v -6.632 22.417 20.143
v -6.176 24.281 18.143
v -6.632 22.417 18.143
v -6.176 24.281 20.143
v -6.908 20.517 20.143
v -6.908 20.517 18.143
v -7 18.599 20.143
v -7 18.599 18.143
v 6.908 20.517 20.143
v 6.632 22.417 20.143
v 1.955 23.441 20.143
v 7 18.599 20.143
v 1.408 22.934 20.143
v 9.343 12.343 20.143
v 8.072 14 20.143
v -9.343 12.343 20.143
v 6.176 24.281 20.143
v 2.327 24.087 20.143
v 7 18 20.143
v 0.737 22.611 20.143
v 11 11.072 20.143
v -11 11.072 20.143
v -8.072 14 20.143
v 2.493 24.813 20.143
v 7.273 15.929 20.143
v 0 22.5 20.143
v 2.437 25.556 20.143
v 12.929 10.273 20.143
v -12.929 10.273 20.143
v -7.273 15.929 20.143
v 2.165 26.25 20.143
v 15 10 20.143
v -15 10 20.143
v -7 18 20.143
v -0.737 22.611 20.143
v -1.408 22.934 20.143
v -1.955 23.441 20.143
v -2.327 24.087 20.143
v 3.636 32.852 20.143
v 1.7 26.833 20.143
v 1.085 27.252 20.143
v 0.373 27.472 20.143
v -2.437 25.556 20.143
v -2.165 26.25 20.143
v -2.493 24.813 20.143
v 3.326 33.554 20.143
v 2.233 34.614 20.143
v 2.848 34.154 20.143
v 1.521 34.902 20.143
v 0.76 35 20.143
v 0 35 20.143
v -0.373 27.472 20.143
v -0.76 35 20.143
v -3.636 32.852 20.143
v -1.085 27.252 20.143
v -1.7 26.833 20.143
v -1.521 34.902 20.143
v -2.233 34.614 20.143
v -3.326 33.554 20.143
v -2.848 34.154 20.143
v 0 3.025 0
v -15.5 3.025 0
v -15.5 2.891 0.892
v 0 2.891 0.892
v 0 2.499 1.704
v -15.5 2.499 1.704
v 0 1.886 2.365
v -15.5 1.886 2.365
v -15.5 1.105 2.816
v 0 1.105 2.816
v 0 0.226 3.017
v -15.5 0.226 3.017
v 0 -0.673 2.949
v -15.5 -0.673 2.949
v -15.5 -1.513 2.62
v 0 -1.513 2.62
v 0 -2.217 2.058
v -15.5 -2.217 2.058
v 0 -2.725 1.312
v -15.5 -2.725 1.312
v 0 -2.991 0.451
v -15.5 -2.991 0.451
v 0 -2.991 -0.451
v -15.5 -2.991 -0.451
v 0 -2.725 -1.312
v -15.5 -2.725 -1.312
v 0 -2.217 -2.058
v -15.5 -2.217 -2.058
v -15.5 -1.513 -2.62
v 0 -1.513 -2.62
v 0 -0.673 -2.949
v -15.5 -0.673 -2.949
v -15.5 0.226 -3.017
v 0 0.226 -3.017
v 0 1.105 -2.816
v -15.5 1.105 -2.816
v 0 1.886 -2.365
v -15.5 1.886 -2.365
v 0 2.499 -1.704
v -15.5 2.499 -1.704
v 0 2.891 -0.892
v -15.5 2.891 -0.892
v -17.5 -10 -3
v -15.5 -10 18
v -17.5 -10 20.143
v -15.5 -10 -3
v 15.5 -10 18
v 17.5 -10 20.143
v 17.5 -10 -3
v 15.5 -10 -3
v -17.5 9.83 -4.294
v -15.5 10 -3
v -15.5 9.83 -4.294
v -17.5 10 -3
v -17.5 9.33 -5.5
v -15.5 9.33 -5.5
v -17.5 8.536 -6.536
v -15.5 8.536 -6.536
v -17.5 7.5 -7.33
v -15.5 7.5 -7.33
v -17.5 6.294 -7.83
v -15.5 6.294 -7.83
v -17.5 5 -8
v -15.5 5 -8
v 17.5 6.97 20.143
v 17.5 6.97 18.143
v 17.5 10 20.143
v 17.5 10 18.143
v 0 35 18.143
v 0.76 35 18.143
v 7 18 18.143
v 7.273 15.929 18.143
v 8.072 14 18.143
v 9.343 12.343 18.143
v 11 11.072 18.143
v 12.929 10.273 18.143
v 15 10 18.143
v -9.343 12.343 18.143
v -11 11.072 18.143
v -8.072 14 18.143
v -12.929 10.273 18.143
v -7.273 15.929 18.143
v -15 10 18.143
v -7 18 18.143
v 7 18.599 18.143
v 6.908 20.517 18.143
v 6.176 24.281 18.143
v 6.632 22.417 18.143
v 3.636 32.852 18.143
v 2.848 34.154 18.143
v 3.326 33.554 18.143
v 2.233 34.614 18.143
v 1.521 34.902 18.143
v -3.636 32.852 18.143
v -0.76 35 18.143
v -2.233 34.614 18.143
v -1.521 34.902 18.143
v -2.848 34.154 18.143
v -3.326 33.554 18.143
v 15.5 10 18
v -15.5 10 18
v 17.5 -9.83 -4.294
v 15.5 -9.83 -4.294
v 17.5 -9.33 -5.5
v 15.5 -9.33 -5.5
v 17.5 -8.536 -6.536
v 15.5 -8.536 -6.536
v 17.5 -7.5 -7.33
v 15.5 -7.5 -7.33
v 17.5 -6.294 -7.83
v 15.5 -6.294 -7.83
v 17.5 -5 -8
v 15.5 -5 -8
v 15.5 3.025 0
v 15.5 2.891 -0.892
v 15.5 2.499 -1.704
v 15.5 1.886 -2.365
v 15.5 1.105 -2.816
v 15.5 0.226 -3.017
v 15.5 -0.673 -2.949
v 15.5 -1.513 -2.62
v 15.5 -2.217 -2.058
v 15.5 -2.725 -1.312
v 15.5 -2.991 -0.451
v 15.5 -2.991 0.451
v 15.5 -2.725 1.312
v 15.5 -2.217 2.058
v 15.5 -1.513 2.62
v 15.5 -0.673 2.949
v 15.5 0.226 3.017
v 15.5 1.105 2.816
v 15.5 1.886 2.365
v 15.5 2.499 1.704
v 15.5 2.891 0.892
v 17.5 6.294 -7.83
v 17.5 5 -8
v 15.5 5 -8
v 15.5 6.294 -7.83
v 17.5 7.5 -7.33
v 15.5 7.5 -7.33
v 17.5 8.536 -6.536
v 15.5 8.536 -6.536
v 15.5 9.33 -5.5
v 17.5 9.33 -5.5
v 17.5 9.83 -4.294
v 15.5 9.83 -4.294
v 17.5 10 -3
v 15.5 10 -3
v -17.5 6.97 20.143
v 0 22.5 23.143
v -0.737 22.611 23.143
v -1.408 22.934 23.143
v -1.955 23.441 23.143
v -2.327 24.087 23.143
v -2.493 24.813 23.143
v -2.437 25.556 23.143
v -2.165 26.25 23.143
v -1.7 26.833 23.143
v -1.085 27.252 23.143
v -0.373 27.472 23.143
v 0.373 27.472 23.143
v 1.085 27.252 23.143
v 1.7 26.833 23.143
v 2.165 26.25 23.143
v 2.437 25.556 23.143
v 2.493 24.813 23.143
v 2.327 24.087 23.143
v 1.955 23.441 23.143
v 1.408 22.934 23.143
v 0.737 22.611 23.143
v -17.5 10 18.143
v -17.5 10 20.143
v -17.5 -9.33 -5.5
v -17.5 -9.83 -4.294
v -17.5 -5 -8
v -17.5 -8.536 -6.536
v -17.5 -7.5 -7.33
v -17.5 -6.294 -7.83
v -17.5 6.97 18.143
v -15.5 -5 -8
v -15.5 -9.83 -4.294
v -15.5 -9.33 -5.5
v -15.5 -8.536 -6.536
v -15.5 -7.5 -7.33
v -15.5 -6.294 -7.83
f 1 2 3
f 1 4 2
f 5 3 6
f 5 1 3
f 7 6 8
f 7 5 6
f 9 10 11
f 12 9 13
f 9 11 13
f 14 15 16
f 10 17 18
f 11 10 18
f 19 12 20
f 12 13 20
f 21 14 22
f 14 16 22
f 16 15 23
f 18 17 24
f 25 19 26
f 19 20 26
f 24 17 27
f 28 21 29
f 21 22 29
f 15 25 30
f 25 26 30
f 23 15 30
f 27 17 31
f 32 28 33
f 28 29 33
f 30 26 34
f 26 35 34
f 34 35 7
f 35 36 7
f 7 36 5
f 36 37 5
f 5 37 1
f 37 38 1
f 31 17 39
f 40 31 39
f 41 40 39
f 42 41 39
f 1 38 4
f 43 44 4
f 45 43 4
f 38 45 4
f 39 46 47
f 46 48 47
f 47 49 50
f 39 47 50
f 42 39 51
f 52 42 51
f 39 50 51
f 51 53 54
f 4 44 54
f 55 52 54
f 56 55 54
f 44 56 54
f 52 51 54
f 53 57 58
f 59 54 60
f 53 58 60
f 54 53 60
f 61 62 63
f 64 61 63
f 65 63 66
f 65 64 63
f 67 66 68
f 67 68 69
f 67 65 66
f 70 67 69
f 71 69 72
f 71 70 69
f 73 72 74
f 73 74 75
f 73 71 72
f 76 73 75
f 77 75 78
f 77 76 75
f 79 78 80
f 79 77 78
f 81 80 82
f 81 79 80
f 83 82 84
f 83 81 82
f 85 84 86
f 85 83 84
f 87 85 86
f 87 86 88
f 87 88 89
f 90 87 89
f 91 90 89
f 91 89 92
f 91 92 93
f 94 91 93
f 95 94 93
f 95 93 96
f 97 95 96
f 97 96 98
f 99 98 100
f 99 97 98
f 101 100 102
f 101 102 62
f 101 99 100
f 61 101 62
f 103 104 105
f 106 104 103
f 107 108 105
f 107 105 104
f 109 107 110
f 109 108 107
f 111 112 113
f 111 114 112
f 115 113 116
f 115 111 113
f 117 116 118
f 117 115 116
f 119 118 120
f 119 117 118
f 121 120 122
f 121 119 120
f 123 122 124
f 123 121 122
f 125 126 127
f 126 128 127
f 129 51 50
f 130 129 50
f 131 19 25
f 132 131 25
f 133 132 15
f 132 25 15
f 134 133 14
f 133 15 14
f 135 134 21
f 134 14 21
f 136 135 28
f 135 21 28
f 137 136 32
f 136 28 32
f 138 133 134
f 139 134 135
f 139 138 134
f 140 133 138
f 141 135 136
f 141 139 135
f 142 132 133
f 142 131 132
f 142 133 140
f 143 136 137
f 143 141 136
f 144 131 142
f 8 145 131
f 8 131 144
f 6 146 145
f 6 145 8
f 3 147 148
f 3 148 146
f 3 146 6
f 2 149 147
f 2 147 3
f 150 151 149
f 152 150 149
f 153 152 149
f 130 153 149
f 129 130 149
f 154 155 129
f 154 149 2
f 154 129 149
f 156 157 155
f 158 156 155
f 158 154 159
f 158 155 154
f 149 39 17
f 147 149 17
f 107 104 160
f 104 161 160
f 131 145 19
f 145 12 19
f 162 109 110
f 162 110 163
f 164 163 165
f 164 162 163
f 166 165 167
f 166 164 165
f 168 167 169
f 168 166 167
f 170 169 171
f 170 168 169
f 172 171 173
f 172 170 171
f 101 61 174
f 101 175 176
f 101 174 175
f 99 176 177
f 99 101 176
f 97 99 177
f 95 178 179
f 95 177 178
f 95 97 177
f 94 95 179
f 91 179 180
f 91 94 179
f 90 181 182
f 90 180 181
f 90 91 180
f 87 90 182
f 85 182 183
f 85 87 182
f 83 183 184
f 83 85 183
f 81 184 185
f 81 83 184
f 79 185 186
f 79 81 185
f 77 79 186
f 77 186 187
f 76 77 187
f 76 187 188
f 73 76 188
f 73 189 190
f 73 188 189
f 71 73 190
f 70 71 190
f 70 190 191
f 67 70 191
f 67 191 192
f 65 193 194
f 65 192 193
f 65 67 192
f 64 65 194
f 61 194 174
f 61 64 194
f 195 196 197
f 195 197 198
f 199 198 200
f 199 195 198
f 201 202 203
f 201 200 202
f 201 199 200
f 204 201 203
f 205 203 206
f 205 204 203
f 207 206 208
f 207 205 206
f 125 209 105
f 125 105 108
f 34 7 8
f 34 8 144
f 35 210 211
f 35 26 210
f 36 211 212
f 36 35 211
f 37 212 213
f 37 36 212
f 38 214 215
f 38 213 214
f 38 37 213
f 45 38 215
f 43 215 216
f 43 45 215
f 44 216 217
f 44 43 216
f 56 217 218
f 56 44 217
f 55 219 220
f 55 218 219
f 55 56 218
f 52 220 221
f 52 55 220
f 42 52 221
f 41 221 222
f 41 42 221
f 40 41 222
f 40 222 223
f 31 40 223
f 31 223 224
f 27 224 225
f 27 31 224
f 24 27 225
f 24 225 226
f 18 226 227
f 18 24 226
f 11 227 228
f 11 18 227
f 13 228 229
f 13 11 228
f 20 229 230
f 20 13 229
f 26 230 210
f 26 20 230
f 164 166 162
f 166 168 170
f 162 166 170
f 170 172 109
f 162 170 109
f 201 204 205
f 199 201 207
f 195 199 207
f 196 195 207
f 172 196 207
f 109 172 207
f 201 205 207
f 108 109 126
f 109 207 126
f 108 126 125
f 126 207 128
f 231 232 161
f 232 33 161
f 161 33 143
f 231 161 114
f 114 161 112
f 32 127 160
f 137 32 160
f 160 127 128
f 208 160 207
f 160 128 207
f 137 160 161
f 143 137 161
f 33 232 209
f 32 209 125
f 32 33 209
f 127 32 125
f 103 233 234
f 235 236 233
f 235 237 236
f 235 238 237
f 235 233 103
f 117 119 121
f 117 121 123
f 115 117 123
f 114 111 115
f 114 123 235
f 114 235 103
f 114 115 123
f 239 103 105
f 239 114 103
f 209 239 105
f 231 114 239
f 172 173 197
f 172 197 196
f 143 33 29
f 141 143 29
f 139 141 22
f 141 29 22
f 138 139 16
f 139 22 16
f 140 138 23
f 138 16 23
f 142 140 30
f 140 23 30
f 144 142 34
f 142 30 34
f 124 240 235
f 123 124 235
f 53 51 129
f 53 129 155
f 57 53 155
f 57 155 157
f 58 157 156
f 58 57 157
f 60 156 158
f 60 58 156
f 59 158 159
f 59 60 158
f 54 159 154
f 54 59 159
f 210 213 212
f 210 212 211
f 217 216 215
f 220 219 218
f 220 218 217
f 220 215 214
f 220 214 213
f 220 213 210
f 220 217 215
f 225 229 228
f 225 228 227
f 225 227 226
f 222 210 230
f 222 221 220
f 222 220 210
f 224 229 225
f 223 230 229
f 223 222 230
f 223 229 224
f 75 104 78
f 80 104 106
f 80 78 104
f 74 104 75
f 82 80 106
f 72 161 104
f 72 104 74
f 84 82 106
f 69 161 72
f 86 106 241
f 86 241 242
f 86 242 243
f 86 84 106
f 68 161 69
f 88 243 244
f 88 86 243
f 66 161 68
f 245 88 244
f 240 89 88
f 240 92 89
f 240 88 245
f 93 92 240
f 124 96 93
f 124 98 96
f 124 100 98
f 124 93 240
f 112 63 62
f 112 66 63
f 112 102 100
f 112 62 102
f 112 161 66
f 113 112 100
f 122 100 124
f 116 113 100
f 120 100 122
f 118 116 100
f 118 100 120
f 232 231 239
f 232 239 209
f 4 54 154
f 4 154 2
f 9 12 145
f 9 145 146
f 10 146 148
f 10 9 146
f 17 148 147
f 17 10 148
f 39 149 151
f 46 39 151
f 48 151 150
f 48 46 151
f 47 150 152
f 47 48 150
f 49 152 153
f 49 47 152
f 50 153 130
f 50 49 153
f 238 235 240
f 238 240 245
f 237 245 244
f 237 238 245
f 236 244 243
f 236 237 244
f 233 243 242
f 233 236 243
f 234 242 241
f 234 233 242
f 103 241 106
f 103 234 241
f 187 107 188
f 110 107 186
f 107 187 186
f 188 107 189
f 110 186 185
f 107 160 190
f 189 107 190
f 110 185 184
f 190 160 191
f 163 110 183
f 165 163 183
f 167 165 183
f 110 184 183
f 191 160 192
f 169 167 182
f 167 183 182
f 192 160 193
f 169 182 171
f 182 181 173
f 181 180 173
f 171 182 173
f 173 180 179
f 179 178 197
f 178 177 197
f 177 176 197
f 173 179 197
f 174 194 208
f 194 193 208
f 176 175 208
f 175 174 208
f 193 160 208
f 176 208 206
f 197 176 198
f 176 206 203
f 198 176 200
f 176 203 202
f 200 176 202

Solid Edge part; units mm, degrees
sketch "Sketch1" plane through (0, 0, 0) normal (1, 0, 0) x (0, 1, 0)
  circle A0 centre (0, 0) radius 3.025
extrude "Protrusion1" add sketch "Sketch1" along normal mid plane 31
sketch "Sketch2" plane through (0, 0, 0) normal (0, -1, 0) x (1, 0, 0)
  line L0 (15.5, 18) -> (15.5, 0)
  line L1 (15.5, 0) -> (15.5, -8)
  line L2 (15.5, -8) -> (17.5, -8)
  line L3 (17.5, -8) -> (17.5, 18)
  line L4 (17.5, 18) -> (17.5, 20.1428)
  line L5 (-17.5, 20.1428) -> (17.5, 20.1428)
  line L6 (-17.5, 18) -> (-17.5, 20.1428)
  line L7 (-17.5, -8) -> (-17.5, 18)
  line L8 (-15.5, -8) -> (-17.5, -8)
  line L9 (-15.5, 0) -> (-15.5, -8)
  line L10 (-15.5, 18) -> (-15.5, 0)
  line L11 (-15.5, 18) -> (15.5, 18)
  dimension "D1" = 18
extrude "ExtrudedProtrusion_2" add sketch "Sketch2" along normal mid plane 20
fillet "Round_1" radius 5 4 edges at (16.5, 10, -8) (-16.5, 10, -8) (-16.5, -10, -8) (16.5, -10, -8)
sketch "Sketch3" plane through (0, 0, 20.1428) normal (0, 0, 1) x (0, -1, 0)
  line L0 (-18.5994, 7) -> (-18, 7)
  arc A0 (-10, 15) -> (-18, 7) centre (-18, 15) cw
  line L1 (-10, 15) -> (-10, 17.5)
  line L2 (-10, 17.5) -> (-6.9702, 17.5)
  line L3 (-6.9702, 17.5) -> (-6.9702, -17.5)
  line L4 (-6.9702, -17.5) -> (-10, -17.5)
  line L5 (-10, -15) -> (-10, -17.5)
  arc A1 (-18, -7) -> (-10, -15) centre (-18, -15) cw
  line L6 (-18.5994, -7) -> (-18, -7)
  arc A2 (-24.2811, -6.176) -> (-18.5994, -7) centre (-18.5994, 13) ccw
  line L7 (-32.8523, -3.6364) -> (-24.2811, -6.176)
  arc A3 (-35, -0.76) -> (-32.8523, -3.6364) centre (-32, -0.76) ccw
  line L8 (-35, 0) -> (-35, -0.76)
  line L9 (-35, 0) -> (-35, 0.76)
  arc A4 (-32.8523, 3.6364) -> (-35, 0.76) centre (-32, 0.76) ccw
  line L10 (-32.8523, 3.6364) -> (-24.2811, 6.176)
  arc A5 (-24.2811, 6.176) -> (-18.5994, 7) centre (-18.5994, -13) cw
extrude "ExtrudedProtrusion_3" add sketch "Sketch3" against normal blind 2
sketch "Sketch4" plane through (0, 12.5, 20.1428) normal (0, 0, 1) x (0, -1, 0)
  circle A0 centre (-12.5, 0) radius 2.5
extrude "Protrusion2" add sketch "Sketch4" along normal up to vertex (3 mm away)
properties material "Steel, structural"
